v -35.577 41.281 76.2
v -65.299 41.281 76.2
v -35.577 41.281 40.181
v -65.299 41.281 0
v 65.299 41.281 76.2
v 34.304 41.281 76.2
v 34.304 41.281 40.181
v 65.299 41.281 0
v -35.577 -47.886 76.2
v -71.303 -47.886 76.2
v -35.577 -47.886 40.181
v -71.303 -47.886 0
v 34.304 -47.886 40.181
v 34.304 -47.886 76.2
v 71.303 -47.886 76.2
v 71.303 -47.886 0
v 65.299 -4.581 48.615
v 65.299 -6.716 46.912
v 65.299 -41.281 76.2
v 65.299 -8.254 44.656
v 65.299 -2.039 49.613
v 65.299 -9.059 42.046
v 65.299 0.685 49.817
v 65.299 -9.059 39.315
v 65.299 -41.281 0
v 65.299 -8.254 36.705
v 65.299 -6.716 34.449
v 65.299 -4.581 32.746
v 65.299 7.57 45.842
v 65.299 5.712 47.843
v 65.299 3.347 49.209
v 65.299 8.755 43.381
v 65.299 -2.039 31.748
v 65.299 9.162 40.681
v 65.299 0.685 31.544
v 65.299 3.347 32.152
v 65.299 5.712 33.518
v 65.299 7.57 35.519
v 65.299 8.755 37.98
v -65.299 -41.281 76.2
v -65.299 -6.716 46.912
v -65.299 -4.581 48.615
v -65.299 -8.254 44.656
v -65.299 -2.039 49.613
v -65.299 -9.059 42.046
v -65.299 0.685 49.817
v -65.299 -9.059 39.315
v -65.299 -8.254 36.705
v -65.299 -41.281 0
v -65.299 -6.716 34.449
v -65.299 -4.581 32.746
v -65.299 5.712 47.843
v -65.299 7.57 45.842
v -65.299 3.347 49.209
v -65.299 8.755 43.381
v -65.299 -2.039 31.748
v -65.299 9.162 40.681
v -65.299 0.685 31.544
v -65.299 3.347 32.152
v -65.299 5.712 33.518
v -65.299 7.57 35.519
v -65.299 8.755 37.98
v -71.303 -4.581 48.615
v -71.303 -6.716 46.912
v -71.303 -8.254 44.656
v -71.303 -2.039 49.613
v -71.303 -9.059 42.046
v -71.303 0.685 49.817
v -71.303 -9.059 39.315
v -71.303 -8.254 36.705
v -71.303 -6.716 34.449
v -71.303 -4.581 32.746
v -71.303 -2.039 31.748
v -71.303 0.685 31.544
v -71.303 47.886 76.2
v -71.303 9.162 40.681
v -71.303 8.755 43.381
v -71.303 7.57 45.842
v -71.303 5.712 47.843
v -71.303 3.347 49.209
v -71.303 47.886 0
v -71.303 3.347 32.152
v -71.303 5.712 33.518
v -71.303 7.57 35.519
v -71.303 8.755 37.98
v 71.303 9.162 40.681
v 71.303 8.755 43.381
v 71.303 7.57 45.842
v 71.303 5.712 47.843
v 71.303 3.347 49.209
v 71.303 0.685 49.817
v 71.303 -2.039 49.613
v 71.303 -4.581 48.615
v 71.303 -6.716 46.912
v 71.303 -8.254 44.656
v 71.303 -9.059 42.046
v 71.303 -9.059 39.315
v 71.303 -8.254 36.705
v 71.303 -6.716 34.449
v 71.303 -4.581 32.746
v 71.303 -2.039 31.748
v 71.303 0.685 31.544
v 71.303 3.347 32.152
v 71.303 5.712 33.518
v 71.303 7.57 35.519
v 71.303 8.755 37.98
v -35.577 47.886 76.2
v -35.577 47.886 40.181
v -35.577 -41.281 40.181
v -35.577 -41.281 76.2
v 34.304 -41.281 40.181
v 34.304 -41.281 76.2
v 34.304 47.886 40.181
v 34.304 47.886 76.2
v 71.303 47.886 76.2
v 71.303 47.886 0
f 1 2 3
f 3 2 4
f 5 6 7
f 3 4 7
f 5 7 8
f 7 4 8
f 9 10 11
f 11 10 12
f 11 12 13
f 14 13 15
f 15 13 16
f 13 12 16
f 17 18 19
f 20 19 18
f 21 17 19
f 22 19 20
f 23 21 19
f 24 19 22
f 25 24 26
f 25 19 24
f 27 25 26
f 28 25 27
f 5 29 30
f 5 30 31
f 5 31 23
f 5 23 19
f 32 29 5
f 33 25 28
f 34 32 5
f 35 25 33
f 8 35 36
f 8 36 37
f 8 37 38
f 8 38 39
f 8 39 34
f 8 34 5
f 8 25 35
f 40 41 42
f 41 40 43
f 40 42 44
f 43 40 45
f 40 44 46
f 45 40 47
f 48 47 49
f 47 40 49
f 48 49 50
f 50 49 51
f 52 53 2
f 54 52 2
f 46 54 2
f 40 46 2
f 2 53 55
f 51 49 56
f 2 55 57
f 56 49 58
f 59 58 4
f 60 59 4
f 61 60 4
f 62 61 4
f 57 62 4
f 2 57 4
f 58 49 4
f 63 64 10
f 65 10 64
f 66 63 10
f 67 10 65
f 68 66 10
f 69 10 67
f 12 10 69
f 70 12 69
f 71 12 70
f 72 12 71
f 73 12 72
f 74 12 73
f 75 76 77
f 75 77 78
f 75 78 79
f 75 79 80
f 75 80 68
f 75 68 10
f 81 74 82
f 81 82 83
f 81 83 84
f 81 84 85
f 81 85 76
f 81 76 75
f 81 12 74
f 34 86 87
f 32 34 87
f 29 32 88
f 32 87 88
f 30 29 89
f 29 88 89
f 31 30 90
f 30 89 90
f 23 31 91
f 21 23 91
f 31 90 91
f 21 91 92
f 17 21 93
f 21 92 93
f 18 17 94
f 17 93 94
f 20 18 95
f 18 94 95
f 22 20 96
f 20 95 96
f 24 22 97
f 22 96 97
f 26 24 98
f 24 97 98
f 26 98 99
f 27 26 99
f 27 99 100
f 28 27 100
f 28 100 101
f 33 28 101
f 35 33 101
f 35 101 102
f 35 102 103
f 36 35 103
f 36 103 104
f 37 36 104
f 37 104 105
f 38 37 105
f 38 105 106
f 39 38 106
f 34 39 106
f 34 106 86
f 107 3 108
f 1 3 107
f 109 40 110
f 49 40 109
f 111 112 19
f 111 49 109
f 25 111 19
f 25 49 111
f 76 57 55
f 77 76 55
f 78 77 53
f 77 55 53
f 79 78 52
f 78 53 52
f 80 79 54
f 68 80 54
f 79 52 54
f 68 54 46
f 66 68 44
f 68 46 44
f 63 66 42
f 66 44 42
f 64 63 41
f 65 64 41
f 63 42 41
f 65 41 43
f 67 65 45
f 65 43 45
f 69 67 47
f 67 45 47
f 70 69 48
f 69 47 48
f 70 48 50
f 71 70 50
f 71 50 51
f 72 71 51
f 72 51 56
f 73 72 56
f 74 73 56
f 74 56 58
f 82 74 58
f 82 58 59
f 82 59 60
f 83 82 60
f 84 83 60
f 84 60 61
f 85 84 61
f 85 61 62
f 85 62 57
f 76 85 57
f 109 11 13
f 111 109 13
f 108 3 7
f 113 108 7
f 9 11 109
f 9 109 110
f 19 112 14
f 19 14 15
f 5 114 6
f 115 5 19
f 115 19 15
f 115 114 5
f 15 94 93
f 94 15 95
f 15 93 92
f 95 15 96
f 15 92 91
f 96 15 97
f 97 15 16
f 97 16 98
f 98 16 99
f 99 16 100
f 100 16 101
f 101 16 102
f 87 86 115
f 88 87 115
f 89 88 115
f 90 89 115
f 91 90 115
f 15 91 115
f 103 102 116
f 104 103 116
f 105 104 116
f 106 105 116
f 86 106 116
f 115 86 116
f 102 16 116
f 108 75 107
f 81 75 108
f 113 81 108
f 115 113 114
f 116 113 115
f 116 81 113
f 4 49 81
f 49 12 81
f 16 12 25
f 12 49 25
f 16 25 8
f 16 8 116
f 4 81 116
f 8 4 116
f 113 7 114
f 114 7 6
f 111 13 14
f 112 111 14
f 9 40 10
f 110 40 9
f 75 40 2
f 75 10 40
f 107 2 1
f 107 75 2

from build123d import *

# Parameters (mm, degrees)
F0_W     = 142.606944
F0_H     = 95.77182
F0_W_2   = 130.597934
F0_H_2   = 82.56191
F1_DEPTH = 76.2
F2_W     = 69.881048
F2_H     = 36.019358
F3_DEPTH = 127
F4_R     = 9.161786
F5_DEPTH = 177.8


with BuildPart() as f1:
    # F0 (on Top) → F1 (new body)
    with BuildSketch(Plane.XY):
        Rectangle(F0_W, F0_H)
        Rectangle(F0_W_2, F0_H_2, mode=Mode.SUBTRACT)
    extrude(amount=F1_DEPTH)

    # F2 (on face) → F3 (cut)
    with BuildSketch(Plane.XZ.offset(47.88591)):
        with Locations((-0.636155, 58.190321)):
            Rectangle(F2_W, F2_H)
    extrude(amount=-F3_DEPTH, mode=Mode.SUBTRACT)

    # F4 (on face) → F5 (cut)
    with BuildSketch(Plane.YZ.offset(71.303472)):
        with Locations((0, 40.680505)):
            Circle(F4_R)
    extrude(amount=-F5_DEPTH, mode=Mode.SUBTRACT)


solid = f1.part
